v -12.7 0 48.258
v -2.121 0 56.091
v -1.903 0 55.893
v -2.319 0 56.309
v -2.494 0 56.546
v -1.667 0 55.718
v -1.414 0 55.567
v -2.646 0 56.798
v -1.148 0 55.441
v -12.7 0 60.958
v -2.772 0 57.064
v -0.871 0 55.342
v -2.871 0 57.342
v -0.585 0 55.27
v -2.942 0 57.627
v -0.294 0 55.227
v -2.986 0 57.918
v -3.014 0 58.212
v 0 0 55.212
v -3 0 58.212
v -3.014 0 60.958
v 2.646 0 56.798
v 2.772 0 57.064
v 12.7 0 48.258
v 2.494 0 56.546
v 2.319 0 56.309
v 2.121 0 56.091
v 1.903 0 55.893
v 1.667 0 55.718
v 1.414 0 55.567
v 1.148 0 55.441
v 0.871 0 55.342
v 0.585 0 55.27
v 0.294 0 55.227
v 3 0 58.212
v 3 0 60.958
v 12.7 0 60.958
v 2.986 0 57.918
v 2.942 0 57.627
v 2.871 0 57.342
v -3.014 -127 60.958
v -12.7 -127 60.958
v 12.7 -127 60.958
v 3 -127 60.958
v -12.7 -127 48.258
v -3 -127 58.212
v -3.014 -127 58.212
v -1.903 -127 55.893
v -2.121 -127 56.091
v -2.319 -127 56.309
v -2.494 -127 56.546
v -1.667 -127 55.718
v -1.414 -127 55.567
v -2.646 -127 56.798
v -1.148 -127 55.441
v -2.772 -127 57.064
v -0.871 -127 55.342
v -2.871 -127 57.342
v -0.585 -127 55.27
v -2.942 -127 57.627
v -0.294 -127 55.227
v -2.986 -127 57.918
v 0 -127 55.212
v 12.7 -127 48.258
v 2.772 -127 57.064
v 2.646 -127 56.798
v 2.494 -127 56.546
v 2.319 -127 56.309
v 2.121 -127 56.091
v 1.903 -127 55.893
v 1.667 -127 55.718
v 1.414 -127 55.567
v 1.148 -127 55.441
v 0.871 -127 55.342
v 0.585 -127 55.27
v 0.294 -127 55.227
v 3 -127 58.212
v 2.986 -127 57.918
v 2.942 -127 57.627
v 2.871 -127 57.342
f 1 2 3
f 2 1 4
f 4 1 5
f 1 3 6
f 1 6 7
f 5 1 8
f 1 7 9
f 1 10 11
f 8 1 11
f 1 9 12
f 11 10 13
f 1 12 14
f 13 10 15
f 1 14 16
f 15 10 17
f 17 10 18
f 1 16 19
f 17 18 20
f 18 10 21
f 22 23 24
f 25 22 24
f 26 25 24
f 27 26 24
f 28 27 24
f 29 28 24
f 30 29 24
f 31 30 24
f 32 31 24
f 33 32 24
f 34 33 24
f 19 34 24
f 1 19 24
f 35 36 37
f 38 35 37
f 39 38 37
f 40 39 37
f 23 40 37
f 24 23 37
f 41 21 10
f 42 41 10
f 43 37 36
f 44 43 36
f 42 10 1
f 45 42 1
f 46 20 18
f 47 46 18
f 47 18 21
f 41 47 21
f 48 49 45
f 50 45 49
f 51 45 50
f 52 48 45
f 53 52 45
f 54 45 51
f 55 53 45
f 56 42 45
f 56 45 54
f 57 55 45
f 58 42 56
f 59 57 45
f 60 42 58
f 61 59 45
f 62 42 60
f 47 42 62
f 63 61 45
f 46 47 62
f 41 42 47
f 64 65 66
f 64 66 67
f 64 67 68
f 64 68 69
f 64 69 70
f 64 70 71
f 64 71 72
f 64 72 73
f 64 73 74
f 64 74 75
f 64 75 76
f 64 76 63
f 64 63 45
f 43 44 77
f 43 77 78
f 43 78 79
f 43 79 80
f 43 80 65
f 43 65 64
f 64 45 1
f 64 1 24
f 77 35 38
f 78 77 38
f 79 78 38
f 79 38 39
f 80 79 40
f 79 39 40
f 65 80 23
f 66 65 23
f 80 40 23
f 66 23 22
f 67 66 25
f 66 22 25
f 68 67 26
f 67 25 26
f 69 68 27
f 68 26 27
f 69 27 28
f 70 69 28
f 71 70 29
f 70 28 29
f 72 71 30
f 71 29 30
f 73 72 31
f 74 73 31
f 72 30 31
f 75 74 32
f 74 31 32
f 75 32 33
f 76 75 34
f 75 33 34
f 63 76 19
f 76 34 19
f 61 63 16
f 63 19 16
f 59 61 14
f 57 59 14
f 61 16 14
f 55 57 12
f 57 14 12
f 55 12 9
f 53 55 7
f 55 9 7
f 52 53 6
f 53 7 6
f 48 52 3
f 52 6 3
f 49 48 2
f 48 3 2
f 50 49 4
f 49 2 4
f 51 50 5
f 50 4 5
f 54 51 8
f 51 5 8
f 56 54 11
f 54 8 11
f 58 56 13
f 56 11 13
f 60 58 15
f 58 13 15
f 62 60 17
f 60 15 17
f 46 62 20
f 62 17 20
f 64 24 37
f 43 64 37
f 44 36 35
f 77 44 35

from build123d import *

# Parameters (mm, degrees)
F1_DEPTH = 127


with BuildPart() as f1:
    # F0 (on Front) → F1 (new body)
    with BuildSketch(Plane.XZ):
        with BuildLine():
            Line((3, 60.958375), (3, 58.212375))
            ThreePointArc((3, 58.212375), (0, 55.212375), (-3, 58.212375))
            Line((-3, 58.212375), (-3.014112, 58.212375))
            Line((-3.014112, 58.212375), (-3.014112, 60.958375))
            Line((-3.014112, 60.958375), (-12.7, 60.958375))
            Line((-12.7, 60.958375), (-12.7, 48.258375))
            Line((-12.7, 48.258375), (12.7, 48.258375))
            Line((12.7, 48.258375), (12.7, 60.958375))
            Line((12.7, 60.958375), (3, 60.958375))
        make_face()
    extrude(amount=F1_DEPTH)


solid = f1.part
